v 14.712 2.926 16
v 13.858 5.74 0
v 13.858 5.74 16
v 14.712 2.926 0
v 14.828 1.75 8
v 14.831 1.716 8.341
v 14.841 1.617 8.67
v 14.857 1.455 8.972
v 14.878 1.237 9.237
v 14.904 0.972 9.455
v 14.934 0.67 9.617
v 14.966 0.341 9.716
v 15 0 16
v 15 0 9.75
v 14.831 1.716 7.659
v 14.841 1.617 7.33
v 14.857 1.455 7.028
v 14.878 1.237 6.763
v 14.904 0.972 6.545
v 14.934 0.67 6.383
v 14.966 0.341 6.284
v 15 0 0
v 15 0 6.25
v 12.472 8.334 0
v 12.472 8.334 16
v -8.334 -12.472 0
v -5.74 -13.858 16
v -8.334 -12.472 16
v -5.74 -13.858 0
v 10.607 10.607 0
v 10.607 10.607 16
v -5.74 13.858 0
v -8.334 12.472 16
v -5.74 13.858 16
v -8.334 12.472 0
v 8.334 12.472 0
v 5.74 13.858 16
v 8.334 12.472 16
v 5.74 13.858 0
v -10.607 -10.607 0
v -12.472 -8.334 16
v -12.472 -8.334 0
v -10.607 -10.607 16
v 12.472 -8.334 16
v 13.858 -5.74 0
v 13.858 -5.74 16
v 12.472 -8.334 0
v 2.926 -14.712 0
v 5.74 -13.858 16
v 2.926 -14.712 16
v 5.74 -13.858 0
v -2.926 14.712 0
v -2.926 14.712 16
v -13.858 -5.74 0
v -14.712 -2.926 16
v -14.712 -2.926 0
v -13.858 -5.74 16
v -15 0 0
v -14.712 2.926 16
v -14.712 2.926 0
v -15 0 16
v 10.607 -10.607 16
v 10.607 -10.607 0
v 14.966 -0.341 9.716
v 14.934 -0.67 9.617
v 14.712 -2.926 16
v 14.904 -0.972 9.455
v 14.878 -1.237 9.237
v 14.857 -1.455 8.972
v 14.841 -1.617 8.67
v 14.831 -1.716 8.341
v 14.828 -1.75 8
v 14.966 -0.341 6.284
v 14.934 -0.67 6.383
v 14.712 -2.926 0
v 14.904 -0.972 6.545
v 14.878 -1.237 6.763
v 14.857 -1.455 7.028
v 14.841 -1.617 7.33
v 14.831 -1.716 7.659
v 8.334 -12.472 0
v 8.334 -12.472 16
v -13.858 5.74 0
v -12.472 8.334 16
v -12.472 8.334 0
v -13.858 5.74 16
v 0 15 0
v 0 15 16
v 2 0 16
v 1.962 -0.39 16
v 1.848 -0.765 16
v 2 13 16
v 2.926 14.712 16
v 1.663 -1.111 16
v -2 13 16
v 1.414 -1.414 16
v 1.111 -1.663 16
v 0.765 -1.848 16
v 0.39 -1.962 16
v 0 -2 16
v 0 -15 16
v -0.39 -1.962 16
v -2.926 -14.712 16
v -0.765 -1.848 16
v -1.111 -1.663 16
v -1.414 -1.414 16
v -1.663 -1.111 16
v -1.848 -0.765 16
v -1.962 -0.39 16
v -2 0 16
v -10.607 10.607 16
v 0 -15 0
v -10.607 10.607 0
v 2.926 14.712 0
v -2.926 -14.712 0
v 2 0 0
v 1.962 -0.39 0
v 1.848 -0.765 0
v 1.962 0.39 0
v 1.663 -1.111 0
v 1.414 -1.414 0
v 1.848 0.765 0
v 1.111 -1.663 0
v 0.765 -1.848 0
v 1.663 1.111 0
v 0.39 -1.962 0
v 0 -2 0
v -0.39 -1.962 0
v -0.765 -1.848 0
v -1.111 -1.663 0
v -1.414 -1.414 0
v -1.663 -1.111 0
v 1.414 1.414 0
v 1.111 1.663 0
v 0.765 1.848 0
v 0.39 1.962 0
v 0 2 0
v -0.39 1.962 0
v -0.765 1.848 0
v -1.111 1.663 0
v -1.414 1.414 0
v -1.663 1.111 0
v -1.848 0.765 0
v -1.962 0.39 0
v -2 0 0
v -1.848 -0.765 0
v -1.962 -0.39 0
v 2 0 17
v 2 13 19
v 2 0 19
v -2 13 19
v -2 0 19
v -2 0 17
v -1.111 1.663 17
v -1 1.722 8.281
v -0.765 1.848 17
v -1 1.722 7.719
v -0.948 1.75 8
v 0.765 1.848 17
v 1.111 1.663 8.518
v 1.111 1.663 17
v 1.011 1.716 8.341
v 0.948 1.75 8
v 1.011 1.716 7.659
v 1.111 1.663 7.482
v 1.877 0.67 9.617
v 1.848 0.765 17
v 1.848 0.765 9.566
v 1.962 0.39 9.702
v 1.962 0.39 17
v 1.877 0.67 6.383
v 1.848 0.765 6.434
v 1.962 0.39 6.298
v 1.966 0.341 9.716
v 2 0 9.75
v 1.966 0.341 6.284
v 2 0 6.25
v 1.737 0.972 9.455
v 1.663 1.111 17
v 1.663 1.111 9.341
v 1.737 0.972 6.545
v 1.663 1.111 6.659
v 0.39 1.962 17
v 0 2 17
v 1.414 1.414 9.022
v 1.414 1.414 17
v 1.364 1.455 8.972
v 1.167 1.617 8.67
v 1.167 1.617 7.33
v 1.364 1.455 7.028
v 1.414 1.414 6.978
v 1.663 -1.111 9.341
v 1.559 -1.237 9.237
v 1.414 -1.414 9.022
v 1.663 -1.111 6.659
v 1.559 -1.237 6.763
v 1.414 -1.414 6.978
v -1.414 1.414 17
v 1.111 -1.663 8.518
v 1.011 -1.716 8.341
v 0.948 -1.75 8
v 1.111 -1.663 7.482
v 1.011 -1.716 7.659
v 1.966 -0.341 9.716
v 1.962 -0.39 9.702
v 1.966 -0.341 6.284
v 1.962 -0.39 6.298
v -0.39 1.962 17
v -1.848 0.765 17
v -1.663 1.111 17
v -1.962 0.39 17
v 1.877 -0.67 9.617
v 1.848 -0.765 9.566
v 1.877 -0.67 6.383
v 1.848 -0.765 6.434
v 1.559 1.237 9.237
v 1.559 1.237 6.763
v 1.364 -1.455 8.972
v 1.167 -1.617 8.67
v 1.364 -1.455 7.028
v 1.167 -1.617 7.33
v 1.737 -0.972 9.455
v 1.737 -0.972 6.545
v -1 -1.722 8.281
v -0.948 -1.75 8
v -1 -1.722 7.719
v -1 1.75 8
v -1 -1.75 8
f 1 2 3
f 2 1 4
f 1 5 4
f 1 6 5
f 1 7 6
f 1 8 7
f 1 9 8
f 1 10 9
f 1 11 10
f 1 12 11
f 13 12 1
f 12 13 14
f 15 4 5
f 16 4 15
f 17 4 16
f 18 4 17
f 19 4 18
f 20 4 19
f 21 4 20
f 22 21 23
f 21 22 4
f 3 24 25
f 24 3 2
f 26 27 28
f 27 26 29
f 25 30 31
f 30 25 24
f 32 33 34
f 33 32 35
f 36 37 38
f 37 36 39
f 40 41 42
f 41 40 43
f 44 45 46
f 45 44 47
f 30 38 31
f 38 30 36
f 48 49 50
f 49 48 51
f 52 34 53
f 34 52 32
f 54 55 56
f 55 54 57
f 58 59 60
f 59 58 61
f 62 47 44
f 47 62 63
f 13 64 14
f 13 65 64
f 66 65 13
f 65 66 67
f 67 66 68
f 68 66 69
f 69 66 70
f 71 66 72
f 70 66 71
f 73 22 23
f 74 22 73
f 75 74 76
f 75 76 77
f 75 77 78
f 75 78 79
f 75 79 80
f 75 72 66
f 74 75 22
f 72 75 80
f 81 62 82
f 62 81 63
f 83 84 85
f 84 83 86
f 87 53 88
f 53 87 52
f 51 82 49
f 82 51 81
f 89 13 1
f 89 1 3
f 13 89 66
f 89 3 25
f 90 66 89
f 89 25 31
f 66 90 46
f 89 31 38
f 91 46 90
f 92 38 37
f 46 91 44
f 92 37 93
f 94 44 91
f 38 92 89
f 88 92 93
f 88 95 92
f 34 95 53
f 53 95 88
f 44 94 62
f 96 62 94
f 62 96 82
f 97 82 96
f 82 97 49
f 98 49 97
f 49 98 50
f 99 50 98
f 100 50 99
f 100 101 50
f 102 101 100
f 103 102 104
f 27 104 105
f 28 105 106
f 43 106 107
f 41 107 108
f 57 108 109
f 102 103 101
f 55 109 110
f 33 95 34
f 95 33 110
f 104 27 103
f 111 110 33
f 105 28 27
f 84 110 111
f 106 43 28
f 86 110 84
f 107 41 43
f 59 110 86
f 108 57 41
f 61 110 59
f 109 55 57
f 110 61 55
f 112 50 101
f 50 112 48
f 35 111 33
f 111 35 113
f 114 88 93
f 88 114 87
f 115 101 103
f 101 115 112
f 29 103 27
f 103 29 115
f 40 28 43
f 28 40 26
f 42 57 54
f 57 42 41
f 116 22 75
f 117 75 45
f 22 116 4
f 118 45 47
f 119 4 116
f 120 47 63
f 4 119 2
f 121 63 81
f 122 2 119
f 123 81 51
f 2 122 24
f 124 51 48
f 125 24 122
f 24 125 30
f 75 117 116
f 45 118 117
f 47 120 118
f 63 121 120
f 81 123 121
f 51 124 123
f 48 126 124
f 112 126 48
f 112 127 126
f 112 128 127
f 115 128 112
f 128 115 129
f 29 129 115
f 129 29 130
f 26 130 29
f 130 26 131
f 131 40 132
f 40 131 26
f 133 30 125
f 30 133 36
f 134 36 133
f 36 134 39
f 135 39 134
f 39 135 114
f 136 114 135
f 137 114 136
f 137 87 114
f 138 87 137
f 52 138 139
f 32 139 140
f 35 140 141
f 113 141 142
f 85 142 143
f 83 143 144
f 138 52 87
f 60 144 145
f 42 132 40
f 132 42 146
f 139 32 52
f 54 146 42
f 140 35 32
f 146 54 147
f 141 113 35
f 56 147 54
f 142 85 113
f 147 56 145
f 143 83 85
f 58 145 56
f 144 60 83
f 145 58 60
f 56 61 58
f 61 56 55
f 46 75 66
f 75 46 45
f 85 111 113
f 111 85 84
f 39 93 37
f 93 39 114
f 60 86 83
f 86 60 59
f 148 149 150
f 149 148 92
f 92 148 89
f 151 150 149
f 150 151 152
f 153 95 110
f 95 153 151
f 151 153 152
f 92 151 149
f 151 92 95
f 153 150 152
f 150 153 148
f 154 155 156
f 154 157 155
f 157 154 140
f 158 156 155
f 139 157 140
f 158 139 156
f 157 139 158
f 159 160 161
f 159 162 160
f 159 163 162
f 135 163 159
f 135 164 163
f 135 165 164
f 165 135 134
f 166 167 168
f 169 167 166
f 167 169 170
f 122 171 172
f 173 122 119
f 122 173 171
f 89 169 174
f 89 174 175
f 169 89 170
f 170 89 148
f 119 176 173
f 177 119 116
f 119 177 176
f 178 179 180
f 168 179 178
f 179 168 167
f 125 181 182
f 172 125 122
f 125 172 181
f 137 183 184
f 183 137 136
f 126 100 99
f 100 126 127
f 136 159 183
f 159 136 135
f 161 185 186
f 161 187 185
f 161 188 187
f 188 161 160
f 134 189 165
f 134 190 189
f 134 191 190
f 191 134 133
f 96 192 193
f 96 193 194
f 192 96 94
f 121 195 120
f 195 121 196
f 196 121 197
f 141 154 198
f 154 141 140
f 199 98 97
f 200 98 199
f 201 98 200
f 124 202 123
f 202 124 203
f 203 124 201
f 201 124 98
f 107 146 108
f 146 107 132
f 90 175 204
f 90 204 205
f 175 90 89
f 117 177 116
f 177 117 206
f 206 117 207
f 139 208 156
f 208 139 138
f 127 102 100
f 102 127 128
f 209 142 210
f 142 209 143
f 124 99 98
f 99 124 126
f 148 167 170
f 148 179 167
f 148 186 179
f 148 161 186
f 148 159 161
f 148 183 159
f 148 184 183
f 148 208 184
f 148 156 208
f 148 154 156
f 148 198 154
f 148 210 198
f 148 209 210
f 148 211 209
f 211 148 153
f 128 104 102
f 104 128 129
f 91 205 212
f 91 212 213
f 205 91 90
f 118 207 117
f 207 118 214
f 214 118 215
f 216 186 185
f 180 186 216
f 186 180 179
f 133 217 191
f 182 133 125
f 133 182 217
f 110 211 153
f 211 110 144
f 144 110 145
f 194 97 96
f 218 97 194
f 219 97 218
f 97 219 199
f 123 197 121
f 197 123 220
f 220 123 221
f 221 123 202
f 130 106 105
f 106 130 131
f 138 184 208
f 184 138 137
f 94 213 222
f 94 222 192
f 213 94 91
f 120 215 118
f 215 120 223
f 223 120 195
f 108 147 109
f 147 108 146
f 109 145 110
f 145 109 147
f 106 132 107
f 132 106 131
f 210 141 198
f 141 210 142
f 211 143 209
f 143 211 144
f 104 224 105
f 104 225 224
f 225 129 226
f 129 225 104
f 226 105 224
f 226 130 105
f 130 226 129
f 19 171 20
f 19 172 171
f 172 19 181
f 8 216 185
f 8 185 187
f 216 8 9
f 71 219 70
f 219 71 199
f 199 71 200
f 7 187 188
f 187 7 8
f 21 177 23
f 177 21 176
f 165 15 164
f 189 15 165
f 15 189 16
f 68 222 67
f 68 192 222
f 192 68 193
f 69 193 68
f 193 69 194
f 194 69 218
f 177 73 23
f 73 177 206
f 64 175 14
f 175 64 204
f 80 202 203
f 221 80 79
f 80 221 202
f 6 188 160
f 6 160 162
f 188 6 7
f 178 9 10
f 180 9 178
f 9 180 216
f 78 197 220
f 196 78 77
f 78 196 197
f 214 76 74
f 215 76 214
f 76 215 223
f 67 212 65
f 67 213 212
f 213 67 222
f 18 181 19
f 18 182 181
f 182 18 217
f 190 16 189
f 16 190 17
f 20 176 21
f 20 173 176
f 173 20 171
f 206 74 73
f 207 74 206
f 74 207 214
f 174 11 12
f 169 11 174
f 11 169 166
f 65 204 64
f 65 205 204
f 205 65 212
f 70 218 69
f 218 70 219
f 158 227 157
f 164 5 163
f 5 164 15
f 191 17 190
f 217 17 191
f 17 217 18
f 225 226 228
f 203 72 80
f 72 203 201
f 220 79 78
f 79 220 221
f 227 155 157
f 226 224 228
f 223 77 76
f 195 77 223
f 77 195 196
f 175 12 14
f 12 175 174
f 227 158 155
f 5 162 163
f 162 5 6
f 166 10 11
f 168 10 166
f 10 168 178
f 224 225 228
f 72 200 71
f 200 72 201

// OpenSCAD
$fn = 32;

// ----------------------------------------------------------------------
// Control knob: pointer knob
// ----------------------------------------------------------------------

// --- parameters (mm) ---
rib_w = 4;                // pointer rib width
rib_h = 4;                // pointer rib height
knob_d = 30;              // knob body diameter
knob_h = 16;              // knob body height
bore_d = 4;               // shaft bore diameter
set_d = 3.5;              // set screw bore diameter

rib_poke = rib_h - 1;  // rib height above the top
total_h = knob_h + rib_h - 1;  // overall height

difference() {
  union() {
    cylinder(h = knob_h, d = knob_d);
    translate([-rib_w / 2, 0, knob_h - 1])
      cube([rib_w, knob_d / 2 - 2, rib_h]);
  }
  translate([0, 0, -1]) cylinder(h = knob_h + 2, d = bore_d);
  translate([-1, 0, knob_h / 2]) rotate([0, 90, 0])
    cylinder(h = knob_d / 2 + bore_d / 2 + 2, d = set_d);}
